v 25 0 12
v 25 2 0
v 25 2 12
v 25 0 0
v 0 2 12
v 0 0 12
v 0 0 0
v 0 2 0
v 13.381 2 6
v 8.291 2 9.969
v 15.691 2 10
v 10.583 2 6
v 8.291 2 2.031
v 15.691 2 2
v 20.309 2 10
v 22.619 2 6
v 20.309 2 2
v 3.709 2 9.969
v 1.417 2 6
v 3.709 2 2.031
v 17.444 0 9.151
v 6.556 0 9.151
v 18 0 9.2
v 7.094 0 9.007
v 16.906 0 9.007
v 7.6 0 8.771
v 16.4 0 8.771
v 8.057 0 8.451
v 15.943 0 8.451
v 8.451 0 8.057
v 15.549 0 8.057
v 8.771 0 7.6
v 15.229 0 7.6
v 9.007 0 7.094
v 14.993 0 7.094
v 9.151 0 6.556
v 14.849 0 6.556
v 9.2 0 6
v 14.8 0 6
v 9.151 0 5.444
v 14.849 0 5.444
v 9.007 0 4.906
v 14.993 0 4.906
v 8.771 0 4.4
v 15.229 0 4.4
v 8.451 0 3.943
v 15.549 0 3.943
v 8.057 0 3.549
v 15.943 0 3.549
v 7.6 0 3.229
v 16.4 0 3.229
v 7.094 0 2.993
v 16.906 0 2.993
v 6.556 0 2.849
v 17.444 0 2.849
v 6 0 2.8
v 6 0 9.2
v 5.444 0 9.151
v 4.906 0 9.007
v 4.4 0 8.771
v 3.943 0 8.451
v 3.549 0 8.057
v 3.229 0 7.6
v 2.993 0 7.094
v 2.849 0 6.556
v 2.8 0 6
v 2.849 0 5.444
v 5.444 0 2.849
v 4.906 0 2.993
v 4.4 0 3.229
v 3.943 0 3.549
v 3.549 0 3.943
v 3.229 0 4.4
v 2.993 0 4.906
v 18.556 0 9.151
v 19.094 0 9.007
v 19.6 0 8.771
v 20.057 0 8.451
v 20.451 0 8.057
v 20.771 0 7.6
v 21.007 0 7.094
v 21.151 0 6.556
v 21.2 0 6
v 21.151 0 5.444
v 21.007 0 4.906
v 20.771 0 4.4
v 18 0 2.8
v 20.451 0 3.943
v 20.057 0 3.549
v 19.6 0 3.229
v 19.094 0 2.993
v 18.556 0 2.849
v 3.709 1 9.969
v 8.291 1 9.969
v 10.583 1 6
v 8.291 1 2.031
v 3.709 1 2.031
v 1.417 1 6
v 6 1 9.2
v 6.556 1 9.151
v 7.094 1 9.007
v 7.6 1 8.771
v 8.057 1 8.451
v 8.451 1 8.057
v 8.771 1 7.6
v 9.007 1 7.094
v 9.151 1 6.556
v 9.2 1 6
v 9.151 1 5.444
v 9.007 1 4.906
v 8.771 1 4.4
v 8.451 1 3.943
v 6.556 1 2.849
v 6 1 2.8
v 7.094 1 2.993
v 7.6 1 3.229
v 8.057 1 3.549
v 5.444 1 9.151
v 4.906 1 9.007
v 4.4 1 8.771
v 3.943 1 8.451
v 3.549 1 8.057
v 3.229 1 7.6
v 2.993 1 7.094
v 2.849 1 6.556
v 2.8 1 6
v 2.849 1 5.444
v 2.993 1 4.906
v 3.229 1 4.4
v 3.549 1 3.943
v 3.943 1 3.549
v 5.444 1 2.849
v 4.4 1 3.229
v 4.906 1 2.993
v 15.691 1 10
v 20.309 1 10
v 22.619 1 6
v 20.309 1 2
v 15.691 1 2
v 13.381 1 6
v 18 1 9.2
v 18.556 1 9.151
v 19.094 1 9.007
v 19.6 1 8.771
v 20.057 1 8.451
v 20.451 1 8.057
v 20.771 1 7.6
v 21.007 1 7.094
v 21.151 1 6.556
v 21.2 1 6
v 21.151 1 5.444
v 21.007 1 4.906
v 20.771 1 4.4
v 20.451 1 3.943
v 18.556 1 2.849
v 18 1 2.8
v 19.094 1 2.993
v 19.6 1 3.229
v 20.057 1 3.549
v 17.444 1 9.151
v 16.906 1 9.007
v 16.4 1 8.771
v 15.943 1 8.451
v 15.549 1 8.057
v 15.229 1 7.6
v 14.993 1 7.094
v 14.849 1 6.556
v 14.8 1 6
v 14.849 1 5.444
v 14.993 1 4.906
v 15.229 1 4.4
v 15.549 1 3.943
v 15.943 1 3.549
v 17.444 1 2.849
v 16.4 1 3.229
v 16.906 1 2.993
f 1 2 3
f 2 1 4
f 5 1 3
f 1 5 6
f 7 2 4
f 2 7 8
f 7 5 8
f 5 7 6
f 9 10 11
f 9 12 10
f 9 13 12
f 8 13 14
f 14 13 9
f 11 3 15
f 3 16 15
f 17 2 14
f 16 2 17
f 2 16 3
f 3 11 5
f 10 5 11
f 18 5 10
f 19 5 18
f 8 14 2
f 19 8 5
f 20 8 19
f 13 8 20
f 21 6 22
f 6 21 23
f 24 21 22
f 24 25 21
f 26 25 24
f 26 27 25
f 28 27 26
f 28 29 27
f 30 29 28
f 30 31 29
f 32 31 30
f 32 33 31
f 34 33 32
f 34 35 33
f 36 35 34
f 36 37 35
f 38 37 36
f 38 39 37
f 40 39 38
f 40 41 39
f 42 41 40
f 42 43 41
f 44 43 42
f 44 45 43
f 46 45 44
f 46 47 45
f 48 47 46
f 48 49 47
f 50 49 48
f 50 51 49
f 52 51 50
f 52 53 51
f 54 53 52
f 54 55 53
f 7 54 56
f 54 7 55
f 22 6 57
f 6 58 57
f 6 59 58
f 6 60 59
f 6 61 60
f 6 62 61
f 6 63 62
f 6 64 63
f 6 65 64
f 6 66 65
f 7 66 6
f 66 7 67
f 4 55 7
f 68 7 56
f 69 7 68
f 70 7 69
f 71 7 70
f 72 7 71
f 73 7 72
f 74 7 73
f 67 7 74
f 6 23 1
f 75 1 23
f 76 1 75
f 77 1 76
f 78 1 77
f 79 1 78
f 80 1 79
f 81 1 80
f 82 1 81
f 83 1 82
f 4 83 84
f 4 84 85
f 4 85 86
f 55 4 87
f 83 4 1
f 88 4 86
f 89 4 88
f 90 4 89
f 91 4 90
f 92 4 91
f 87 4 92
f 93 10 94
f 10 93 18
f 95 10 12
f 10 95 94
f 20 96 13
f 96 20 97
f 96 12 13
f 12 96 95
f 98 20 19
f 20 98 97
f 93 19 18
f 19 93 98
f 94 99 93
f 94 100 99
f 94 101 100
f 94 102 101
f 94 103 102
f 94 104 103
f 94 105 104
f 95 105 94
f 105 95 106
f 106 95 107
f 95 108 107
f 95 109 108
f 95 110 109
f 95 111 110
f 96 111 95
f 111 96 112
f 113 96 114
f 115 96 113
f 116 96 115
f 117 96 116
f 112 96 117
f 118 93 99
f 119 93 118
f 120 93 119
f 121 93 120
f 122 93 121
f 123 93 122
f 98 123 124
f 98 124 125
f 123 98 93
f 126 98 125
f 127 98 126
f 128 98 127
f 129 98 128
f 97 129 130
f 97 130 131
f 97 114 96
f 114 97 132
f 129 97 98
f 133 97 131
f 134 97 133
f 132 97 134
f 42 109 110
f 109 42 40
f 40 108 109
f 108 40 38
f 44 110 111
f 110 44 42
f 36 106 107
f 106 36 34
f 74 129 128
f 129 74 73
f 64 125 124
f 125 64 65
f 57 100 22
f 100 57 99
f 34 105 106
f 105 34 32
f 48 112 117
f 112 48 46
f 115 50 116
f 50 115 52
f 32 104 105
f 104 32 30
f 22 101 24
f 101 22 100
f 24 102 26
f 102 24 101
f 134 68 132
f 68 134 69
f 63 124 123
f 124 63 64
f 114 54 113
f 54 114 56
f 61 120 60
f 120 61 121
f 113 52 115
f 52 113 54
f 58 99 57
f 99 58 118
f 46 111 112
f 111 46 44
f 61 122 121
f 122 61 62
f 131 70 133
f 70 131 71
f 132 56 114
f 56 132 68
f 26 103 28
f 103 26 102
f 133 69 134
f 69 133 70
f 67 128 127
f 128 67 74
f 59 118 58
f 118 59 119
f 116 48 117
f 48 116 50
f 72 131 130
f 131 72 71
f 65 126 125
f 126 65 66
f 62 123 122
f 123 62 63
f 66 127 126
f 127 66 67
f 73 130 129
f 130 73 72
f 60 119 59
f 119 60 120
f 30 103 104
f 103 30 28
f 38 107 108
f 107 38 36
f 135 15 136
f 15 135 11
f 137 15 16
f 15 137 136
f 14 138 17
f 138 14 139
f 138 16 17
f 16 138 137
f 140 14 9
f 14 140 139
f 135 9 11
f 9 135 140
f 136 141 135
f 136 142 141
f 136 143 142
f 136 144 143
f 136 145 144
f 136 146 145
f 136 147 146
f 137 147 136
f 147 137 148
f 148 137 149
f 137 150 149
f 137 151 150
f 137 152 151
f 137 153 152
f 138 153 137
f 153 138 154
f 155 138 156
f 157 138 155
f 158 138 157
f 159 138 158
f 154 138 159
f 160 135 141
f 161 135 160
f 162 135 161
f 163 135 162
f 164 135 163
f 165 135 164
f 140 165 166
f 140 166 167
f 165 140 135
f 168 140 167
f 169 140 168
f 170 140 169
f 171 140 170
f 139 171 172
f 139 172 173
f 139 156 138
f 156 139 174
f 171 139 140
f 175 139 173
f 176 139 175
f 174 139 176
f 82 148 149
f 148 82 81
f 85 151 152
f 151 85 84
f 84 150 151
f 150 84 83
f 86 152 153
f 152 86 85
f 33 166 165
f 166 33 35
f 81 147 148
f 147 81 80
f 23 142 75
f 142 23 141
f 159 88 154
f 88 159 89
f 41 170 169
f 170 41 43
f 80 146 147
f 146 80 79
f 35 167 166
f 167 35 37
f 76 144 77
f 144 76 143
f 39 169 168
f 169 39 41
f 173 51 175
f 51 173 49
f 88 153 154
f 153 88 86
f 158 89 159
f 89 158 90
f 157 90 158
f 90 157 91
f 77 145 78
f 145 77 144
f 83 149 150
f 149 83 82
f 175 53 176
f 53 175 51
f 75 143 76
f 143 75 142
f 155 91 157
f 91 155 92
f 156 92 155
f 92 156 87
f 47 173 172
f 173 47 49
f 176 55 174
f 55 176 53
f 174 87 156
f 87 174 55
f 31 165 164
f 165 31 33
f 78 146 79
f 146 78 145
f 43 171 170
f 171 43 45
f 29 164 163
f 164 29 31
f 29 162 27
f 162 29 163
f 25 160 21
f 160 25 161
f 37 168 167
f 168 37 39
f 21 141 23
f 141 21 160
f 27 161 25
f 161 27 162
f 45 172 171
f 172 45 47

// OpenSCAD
difference() {
    cube([25,2,12]);
    translate([6,1,6])
    rotate([-90,0,0])
    cylinder(h=5.0,r=4.582734,$fn=6);
    translate([6,-1,6])
    rotate([-90,0,0])
    cylinder(h=5.0,r=3.2,$fn=36);
    translate([18,1,6])
    rotate([-90,0,0])
    cylinder(h=5.0,r=4.61895,$fn=6);
    translate([18,-1,6])
    rotate([-90,0,0])
    cylinder(h=5.0,r=3.2,$fn=36);
}
